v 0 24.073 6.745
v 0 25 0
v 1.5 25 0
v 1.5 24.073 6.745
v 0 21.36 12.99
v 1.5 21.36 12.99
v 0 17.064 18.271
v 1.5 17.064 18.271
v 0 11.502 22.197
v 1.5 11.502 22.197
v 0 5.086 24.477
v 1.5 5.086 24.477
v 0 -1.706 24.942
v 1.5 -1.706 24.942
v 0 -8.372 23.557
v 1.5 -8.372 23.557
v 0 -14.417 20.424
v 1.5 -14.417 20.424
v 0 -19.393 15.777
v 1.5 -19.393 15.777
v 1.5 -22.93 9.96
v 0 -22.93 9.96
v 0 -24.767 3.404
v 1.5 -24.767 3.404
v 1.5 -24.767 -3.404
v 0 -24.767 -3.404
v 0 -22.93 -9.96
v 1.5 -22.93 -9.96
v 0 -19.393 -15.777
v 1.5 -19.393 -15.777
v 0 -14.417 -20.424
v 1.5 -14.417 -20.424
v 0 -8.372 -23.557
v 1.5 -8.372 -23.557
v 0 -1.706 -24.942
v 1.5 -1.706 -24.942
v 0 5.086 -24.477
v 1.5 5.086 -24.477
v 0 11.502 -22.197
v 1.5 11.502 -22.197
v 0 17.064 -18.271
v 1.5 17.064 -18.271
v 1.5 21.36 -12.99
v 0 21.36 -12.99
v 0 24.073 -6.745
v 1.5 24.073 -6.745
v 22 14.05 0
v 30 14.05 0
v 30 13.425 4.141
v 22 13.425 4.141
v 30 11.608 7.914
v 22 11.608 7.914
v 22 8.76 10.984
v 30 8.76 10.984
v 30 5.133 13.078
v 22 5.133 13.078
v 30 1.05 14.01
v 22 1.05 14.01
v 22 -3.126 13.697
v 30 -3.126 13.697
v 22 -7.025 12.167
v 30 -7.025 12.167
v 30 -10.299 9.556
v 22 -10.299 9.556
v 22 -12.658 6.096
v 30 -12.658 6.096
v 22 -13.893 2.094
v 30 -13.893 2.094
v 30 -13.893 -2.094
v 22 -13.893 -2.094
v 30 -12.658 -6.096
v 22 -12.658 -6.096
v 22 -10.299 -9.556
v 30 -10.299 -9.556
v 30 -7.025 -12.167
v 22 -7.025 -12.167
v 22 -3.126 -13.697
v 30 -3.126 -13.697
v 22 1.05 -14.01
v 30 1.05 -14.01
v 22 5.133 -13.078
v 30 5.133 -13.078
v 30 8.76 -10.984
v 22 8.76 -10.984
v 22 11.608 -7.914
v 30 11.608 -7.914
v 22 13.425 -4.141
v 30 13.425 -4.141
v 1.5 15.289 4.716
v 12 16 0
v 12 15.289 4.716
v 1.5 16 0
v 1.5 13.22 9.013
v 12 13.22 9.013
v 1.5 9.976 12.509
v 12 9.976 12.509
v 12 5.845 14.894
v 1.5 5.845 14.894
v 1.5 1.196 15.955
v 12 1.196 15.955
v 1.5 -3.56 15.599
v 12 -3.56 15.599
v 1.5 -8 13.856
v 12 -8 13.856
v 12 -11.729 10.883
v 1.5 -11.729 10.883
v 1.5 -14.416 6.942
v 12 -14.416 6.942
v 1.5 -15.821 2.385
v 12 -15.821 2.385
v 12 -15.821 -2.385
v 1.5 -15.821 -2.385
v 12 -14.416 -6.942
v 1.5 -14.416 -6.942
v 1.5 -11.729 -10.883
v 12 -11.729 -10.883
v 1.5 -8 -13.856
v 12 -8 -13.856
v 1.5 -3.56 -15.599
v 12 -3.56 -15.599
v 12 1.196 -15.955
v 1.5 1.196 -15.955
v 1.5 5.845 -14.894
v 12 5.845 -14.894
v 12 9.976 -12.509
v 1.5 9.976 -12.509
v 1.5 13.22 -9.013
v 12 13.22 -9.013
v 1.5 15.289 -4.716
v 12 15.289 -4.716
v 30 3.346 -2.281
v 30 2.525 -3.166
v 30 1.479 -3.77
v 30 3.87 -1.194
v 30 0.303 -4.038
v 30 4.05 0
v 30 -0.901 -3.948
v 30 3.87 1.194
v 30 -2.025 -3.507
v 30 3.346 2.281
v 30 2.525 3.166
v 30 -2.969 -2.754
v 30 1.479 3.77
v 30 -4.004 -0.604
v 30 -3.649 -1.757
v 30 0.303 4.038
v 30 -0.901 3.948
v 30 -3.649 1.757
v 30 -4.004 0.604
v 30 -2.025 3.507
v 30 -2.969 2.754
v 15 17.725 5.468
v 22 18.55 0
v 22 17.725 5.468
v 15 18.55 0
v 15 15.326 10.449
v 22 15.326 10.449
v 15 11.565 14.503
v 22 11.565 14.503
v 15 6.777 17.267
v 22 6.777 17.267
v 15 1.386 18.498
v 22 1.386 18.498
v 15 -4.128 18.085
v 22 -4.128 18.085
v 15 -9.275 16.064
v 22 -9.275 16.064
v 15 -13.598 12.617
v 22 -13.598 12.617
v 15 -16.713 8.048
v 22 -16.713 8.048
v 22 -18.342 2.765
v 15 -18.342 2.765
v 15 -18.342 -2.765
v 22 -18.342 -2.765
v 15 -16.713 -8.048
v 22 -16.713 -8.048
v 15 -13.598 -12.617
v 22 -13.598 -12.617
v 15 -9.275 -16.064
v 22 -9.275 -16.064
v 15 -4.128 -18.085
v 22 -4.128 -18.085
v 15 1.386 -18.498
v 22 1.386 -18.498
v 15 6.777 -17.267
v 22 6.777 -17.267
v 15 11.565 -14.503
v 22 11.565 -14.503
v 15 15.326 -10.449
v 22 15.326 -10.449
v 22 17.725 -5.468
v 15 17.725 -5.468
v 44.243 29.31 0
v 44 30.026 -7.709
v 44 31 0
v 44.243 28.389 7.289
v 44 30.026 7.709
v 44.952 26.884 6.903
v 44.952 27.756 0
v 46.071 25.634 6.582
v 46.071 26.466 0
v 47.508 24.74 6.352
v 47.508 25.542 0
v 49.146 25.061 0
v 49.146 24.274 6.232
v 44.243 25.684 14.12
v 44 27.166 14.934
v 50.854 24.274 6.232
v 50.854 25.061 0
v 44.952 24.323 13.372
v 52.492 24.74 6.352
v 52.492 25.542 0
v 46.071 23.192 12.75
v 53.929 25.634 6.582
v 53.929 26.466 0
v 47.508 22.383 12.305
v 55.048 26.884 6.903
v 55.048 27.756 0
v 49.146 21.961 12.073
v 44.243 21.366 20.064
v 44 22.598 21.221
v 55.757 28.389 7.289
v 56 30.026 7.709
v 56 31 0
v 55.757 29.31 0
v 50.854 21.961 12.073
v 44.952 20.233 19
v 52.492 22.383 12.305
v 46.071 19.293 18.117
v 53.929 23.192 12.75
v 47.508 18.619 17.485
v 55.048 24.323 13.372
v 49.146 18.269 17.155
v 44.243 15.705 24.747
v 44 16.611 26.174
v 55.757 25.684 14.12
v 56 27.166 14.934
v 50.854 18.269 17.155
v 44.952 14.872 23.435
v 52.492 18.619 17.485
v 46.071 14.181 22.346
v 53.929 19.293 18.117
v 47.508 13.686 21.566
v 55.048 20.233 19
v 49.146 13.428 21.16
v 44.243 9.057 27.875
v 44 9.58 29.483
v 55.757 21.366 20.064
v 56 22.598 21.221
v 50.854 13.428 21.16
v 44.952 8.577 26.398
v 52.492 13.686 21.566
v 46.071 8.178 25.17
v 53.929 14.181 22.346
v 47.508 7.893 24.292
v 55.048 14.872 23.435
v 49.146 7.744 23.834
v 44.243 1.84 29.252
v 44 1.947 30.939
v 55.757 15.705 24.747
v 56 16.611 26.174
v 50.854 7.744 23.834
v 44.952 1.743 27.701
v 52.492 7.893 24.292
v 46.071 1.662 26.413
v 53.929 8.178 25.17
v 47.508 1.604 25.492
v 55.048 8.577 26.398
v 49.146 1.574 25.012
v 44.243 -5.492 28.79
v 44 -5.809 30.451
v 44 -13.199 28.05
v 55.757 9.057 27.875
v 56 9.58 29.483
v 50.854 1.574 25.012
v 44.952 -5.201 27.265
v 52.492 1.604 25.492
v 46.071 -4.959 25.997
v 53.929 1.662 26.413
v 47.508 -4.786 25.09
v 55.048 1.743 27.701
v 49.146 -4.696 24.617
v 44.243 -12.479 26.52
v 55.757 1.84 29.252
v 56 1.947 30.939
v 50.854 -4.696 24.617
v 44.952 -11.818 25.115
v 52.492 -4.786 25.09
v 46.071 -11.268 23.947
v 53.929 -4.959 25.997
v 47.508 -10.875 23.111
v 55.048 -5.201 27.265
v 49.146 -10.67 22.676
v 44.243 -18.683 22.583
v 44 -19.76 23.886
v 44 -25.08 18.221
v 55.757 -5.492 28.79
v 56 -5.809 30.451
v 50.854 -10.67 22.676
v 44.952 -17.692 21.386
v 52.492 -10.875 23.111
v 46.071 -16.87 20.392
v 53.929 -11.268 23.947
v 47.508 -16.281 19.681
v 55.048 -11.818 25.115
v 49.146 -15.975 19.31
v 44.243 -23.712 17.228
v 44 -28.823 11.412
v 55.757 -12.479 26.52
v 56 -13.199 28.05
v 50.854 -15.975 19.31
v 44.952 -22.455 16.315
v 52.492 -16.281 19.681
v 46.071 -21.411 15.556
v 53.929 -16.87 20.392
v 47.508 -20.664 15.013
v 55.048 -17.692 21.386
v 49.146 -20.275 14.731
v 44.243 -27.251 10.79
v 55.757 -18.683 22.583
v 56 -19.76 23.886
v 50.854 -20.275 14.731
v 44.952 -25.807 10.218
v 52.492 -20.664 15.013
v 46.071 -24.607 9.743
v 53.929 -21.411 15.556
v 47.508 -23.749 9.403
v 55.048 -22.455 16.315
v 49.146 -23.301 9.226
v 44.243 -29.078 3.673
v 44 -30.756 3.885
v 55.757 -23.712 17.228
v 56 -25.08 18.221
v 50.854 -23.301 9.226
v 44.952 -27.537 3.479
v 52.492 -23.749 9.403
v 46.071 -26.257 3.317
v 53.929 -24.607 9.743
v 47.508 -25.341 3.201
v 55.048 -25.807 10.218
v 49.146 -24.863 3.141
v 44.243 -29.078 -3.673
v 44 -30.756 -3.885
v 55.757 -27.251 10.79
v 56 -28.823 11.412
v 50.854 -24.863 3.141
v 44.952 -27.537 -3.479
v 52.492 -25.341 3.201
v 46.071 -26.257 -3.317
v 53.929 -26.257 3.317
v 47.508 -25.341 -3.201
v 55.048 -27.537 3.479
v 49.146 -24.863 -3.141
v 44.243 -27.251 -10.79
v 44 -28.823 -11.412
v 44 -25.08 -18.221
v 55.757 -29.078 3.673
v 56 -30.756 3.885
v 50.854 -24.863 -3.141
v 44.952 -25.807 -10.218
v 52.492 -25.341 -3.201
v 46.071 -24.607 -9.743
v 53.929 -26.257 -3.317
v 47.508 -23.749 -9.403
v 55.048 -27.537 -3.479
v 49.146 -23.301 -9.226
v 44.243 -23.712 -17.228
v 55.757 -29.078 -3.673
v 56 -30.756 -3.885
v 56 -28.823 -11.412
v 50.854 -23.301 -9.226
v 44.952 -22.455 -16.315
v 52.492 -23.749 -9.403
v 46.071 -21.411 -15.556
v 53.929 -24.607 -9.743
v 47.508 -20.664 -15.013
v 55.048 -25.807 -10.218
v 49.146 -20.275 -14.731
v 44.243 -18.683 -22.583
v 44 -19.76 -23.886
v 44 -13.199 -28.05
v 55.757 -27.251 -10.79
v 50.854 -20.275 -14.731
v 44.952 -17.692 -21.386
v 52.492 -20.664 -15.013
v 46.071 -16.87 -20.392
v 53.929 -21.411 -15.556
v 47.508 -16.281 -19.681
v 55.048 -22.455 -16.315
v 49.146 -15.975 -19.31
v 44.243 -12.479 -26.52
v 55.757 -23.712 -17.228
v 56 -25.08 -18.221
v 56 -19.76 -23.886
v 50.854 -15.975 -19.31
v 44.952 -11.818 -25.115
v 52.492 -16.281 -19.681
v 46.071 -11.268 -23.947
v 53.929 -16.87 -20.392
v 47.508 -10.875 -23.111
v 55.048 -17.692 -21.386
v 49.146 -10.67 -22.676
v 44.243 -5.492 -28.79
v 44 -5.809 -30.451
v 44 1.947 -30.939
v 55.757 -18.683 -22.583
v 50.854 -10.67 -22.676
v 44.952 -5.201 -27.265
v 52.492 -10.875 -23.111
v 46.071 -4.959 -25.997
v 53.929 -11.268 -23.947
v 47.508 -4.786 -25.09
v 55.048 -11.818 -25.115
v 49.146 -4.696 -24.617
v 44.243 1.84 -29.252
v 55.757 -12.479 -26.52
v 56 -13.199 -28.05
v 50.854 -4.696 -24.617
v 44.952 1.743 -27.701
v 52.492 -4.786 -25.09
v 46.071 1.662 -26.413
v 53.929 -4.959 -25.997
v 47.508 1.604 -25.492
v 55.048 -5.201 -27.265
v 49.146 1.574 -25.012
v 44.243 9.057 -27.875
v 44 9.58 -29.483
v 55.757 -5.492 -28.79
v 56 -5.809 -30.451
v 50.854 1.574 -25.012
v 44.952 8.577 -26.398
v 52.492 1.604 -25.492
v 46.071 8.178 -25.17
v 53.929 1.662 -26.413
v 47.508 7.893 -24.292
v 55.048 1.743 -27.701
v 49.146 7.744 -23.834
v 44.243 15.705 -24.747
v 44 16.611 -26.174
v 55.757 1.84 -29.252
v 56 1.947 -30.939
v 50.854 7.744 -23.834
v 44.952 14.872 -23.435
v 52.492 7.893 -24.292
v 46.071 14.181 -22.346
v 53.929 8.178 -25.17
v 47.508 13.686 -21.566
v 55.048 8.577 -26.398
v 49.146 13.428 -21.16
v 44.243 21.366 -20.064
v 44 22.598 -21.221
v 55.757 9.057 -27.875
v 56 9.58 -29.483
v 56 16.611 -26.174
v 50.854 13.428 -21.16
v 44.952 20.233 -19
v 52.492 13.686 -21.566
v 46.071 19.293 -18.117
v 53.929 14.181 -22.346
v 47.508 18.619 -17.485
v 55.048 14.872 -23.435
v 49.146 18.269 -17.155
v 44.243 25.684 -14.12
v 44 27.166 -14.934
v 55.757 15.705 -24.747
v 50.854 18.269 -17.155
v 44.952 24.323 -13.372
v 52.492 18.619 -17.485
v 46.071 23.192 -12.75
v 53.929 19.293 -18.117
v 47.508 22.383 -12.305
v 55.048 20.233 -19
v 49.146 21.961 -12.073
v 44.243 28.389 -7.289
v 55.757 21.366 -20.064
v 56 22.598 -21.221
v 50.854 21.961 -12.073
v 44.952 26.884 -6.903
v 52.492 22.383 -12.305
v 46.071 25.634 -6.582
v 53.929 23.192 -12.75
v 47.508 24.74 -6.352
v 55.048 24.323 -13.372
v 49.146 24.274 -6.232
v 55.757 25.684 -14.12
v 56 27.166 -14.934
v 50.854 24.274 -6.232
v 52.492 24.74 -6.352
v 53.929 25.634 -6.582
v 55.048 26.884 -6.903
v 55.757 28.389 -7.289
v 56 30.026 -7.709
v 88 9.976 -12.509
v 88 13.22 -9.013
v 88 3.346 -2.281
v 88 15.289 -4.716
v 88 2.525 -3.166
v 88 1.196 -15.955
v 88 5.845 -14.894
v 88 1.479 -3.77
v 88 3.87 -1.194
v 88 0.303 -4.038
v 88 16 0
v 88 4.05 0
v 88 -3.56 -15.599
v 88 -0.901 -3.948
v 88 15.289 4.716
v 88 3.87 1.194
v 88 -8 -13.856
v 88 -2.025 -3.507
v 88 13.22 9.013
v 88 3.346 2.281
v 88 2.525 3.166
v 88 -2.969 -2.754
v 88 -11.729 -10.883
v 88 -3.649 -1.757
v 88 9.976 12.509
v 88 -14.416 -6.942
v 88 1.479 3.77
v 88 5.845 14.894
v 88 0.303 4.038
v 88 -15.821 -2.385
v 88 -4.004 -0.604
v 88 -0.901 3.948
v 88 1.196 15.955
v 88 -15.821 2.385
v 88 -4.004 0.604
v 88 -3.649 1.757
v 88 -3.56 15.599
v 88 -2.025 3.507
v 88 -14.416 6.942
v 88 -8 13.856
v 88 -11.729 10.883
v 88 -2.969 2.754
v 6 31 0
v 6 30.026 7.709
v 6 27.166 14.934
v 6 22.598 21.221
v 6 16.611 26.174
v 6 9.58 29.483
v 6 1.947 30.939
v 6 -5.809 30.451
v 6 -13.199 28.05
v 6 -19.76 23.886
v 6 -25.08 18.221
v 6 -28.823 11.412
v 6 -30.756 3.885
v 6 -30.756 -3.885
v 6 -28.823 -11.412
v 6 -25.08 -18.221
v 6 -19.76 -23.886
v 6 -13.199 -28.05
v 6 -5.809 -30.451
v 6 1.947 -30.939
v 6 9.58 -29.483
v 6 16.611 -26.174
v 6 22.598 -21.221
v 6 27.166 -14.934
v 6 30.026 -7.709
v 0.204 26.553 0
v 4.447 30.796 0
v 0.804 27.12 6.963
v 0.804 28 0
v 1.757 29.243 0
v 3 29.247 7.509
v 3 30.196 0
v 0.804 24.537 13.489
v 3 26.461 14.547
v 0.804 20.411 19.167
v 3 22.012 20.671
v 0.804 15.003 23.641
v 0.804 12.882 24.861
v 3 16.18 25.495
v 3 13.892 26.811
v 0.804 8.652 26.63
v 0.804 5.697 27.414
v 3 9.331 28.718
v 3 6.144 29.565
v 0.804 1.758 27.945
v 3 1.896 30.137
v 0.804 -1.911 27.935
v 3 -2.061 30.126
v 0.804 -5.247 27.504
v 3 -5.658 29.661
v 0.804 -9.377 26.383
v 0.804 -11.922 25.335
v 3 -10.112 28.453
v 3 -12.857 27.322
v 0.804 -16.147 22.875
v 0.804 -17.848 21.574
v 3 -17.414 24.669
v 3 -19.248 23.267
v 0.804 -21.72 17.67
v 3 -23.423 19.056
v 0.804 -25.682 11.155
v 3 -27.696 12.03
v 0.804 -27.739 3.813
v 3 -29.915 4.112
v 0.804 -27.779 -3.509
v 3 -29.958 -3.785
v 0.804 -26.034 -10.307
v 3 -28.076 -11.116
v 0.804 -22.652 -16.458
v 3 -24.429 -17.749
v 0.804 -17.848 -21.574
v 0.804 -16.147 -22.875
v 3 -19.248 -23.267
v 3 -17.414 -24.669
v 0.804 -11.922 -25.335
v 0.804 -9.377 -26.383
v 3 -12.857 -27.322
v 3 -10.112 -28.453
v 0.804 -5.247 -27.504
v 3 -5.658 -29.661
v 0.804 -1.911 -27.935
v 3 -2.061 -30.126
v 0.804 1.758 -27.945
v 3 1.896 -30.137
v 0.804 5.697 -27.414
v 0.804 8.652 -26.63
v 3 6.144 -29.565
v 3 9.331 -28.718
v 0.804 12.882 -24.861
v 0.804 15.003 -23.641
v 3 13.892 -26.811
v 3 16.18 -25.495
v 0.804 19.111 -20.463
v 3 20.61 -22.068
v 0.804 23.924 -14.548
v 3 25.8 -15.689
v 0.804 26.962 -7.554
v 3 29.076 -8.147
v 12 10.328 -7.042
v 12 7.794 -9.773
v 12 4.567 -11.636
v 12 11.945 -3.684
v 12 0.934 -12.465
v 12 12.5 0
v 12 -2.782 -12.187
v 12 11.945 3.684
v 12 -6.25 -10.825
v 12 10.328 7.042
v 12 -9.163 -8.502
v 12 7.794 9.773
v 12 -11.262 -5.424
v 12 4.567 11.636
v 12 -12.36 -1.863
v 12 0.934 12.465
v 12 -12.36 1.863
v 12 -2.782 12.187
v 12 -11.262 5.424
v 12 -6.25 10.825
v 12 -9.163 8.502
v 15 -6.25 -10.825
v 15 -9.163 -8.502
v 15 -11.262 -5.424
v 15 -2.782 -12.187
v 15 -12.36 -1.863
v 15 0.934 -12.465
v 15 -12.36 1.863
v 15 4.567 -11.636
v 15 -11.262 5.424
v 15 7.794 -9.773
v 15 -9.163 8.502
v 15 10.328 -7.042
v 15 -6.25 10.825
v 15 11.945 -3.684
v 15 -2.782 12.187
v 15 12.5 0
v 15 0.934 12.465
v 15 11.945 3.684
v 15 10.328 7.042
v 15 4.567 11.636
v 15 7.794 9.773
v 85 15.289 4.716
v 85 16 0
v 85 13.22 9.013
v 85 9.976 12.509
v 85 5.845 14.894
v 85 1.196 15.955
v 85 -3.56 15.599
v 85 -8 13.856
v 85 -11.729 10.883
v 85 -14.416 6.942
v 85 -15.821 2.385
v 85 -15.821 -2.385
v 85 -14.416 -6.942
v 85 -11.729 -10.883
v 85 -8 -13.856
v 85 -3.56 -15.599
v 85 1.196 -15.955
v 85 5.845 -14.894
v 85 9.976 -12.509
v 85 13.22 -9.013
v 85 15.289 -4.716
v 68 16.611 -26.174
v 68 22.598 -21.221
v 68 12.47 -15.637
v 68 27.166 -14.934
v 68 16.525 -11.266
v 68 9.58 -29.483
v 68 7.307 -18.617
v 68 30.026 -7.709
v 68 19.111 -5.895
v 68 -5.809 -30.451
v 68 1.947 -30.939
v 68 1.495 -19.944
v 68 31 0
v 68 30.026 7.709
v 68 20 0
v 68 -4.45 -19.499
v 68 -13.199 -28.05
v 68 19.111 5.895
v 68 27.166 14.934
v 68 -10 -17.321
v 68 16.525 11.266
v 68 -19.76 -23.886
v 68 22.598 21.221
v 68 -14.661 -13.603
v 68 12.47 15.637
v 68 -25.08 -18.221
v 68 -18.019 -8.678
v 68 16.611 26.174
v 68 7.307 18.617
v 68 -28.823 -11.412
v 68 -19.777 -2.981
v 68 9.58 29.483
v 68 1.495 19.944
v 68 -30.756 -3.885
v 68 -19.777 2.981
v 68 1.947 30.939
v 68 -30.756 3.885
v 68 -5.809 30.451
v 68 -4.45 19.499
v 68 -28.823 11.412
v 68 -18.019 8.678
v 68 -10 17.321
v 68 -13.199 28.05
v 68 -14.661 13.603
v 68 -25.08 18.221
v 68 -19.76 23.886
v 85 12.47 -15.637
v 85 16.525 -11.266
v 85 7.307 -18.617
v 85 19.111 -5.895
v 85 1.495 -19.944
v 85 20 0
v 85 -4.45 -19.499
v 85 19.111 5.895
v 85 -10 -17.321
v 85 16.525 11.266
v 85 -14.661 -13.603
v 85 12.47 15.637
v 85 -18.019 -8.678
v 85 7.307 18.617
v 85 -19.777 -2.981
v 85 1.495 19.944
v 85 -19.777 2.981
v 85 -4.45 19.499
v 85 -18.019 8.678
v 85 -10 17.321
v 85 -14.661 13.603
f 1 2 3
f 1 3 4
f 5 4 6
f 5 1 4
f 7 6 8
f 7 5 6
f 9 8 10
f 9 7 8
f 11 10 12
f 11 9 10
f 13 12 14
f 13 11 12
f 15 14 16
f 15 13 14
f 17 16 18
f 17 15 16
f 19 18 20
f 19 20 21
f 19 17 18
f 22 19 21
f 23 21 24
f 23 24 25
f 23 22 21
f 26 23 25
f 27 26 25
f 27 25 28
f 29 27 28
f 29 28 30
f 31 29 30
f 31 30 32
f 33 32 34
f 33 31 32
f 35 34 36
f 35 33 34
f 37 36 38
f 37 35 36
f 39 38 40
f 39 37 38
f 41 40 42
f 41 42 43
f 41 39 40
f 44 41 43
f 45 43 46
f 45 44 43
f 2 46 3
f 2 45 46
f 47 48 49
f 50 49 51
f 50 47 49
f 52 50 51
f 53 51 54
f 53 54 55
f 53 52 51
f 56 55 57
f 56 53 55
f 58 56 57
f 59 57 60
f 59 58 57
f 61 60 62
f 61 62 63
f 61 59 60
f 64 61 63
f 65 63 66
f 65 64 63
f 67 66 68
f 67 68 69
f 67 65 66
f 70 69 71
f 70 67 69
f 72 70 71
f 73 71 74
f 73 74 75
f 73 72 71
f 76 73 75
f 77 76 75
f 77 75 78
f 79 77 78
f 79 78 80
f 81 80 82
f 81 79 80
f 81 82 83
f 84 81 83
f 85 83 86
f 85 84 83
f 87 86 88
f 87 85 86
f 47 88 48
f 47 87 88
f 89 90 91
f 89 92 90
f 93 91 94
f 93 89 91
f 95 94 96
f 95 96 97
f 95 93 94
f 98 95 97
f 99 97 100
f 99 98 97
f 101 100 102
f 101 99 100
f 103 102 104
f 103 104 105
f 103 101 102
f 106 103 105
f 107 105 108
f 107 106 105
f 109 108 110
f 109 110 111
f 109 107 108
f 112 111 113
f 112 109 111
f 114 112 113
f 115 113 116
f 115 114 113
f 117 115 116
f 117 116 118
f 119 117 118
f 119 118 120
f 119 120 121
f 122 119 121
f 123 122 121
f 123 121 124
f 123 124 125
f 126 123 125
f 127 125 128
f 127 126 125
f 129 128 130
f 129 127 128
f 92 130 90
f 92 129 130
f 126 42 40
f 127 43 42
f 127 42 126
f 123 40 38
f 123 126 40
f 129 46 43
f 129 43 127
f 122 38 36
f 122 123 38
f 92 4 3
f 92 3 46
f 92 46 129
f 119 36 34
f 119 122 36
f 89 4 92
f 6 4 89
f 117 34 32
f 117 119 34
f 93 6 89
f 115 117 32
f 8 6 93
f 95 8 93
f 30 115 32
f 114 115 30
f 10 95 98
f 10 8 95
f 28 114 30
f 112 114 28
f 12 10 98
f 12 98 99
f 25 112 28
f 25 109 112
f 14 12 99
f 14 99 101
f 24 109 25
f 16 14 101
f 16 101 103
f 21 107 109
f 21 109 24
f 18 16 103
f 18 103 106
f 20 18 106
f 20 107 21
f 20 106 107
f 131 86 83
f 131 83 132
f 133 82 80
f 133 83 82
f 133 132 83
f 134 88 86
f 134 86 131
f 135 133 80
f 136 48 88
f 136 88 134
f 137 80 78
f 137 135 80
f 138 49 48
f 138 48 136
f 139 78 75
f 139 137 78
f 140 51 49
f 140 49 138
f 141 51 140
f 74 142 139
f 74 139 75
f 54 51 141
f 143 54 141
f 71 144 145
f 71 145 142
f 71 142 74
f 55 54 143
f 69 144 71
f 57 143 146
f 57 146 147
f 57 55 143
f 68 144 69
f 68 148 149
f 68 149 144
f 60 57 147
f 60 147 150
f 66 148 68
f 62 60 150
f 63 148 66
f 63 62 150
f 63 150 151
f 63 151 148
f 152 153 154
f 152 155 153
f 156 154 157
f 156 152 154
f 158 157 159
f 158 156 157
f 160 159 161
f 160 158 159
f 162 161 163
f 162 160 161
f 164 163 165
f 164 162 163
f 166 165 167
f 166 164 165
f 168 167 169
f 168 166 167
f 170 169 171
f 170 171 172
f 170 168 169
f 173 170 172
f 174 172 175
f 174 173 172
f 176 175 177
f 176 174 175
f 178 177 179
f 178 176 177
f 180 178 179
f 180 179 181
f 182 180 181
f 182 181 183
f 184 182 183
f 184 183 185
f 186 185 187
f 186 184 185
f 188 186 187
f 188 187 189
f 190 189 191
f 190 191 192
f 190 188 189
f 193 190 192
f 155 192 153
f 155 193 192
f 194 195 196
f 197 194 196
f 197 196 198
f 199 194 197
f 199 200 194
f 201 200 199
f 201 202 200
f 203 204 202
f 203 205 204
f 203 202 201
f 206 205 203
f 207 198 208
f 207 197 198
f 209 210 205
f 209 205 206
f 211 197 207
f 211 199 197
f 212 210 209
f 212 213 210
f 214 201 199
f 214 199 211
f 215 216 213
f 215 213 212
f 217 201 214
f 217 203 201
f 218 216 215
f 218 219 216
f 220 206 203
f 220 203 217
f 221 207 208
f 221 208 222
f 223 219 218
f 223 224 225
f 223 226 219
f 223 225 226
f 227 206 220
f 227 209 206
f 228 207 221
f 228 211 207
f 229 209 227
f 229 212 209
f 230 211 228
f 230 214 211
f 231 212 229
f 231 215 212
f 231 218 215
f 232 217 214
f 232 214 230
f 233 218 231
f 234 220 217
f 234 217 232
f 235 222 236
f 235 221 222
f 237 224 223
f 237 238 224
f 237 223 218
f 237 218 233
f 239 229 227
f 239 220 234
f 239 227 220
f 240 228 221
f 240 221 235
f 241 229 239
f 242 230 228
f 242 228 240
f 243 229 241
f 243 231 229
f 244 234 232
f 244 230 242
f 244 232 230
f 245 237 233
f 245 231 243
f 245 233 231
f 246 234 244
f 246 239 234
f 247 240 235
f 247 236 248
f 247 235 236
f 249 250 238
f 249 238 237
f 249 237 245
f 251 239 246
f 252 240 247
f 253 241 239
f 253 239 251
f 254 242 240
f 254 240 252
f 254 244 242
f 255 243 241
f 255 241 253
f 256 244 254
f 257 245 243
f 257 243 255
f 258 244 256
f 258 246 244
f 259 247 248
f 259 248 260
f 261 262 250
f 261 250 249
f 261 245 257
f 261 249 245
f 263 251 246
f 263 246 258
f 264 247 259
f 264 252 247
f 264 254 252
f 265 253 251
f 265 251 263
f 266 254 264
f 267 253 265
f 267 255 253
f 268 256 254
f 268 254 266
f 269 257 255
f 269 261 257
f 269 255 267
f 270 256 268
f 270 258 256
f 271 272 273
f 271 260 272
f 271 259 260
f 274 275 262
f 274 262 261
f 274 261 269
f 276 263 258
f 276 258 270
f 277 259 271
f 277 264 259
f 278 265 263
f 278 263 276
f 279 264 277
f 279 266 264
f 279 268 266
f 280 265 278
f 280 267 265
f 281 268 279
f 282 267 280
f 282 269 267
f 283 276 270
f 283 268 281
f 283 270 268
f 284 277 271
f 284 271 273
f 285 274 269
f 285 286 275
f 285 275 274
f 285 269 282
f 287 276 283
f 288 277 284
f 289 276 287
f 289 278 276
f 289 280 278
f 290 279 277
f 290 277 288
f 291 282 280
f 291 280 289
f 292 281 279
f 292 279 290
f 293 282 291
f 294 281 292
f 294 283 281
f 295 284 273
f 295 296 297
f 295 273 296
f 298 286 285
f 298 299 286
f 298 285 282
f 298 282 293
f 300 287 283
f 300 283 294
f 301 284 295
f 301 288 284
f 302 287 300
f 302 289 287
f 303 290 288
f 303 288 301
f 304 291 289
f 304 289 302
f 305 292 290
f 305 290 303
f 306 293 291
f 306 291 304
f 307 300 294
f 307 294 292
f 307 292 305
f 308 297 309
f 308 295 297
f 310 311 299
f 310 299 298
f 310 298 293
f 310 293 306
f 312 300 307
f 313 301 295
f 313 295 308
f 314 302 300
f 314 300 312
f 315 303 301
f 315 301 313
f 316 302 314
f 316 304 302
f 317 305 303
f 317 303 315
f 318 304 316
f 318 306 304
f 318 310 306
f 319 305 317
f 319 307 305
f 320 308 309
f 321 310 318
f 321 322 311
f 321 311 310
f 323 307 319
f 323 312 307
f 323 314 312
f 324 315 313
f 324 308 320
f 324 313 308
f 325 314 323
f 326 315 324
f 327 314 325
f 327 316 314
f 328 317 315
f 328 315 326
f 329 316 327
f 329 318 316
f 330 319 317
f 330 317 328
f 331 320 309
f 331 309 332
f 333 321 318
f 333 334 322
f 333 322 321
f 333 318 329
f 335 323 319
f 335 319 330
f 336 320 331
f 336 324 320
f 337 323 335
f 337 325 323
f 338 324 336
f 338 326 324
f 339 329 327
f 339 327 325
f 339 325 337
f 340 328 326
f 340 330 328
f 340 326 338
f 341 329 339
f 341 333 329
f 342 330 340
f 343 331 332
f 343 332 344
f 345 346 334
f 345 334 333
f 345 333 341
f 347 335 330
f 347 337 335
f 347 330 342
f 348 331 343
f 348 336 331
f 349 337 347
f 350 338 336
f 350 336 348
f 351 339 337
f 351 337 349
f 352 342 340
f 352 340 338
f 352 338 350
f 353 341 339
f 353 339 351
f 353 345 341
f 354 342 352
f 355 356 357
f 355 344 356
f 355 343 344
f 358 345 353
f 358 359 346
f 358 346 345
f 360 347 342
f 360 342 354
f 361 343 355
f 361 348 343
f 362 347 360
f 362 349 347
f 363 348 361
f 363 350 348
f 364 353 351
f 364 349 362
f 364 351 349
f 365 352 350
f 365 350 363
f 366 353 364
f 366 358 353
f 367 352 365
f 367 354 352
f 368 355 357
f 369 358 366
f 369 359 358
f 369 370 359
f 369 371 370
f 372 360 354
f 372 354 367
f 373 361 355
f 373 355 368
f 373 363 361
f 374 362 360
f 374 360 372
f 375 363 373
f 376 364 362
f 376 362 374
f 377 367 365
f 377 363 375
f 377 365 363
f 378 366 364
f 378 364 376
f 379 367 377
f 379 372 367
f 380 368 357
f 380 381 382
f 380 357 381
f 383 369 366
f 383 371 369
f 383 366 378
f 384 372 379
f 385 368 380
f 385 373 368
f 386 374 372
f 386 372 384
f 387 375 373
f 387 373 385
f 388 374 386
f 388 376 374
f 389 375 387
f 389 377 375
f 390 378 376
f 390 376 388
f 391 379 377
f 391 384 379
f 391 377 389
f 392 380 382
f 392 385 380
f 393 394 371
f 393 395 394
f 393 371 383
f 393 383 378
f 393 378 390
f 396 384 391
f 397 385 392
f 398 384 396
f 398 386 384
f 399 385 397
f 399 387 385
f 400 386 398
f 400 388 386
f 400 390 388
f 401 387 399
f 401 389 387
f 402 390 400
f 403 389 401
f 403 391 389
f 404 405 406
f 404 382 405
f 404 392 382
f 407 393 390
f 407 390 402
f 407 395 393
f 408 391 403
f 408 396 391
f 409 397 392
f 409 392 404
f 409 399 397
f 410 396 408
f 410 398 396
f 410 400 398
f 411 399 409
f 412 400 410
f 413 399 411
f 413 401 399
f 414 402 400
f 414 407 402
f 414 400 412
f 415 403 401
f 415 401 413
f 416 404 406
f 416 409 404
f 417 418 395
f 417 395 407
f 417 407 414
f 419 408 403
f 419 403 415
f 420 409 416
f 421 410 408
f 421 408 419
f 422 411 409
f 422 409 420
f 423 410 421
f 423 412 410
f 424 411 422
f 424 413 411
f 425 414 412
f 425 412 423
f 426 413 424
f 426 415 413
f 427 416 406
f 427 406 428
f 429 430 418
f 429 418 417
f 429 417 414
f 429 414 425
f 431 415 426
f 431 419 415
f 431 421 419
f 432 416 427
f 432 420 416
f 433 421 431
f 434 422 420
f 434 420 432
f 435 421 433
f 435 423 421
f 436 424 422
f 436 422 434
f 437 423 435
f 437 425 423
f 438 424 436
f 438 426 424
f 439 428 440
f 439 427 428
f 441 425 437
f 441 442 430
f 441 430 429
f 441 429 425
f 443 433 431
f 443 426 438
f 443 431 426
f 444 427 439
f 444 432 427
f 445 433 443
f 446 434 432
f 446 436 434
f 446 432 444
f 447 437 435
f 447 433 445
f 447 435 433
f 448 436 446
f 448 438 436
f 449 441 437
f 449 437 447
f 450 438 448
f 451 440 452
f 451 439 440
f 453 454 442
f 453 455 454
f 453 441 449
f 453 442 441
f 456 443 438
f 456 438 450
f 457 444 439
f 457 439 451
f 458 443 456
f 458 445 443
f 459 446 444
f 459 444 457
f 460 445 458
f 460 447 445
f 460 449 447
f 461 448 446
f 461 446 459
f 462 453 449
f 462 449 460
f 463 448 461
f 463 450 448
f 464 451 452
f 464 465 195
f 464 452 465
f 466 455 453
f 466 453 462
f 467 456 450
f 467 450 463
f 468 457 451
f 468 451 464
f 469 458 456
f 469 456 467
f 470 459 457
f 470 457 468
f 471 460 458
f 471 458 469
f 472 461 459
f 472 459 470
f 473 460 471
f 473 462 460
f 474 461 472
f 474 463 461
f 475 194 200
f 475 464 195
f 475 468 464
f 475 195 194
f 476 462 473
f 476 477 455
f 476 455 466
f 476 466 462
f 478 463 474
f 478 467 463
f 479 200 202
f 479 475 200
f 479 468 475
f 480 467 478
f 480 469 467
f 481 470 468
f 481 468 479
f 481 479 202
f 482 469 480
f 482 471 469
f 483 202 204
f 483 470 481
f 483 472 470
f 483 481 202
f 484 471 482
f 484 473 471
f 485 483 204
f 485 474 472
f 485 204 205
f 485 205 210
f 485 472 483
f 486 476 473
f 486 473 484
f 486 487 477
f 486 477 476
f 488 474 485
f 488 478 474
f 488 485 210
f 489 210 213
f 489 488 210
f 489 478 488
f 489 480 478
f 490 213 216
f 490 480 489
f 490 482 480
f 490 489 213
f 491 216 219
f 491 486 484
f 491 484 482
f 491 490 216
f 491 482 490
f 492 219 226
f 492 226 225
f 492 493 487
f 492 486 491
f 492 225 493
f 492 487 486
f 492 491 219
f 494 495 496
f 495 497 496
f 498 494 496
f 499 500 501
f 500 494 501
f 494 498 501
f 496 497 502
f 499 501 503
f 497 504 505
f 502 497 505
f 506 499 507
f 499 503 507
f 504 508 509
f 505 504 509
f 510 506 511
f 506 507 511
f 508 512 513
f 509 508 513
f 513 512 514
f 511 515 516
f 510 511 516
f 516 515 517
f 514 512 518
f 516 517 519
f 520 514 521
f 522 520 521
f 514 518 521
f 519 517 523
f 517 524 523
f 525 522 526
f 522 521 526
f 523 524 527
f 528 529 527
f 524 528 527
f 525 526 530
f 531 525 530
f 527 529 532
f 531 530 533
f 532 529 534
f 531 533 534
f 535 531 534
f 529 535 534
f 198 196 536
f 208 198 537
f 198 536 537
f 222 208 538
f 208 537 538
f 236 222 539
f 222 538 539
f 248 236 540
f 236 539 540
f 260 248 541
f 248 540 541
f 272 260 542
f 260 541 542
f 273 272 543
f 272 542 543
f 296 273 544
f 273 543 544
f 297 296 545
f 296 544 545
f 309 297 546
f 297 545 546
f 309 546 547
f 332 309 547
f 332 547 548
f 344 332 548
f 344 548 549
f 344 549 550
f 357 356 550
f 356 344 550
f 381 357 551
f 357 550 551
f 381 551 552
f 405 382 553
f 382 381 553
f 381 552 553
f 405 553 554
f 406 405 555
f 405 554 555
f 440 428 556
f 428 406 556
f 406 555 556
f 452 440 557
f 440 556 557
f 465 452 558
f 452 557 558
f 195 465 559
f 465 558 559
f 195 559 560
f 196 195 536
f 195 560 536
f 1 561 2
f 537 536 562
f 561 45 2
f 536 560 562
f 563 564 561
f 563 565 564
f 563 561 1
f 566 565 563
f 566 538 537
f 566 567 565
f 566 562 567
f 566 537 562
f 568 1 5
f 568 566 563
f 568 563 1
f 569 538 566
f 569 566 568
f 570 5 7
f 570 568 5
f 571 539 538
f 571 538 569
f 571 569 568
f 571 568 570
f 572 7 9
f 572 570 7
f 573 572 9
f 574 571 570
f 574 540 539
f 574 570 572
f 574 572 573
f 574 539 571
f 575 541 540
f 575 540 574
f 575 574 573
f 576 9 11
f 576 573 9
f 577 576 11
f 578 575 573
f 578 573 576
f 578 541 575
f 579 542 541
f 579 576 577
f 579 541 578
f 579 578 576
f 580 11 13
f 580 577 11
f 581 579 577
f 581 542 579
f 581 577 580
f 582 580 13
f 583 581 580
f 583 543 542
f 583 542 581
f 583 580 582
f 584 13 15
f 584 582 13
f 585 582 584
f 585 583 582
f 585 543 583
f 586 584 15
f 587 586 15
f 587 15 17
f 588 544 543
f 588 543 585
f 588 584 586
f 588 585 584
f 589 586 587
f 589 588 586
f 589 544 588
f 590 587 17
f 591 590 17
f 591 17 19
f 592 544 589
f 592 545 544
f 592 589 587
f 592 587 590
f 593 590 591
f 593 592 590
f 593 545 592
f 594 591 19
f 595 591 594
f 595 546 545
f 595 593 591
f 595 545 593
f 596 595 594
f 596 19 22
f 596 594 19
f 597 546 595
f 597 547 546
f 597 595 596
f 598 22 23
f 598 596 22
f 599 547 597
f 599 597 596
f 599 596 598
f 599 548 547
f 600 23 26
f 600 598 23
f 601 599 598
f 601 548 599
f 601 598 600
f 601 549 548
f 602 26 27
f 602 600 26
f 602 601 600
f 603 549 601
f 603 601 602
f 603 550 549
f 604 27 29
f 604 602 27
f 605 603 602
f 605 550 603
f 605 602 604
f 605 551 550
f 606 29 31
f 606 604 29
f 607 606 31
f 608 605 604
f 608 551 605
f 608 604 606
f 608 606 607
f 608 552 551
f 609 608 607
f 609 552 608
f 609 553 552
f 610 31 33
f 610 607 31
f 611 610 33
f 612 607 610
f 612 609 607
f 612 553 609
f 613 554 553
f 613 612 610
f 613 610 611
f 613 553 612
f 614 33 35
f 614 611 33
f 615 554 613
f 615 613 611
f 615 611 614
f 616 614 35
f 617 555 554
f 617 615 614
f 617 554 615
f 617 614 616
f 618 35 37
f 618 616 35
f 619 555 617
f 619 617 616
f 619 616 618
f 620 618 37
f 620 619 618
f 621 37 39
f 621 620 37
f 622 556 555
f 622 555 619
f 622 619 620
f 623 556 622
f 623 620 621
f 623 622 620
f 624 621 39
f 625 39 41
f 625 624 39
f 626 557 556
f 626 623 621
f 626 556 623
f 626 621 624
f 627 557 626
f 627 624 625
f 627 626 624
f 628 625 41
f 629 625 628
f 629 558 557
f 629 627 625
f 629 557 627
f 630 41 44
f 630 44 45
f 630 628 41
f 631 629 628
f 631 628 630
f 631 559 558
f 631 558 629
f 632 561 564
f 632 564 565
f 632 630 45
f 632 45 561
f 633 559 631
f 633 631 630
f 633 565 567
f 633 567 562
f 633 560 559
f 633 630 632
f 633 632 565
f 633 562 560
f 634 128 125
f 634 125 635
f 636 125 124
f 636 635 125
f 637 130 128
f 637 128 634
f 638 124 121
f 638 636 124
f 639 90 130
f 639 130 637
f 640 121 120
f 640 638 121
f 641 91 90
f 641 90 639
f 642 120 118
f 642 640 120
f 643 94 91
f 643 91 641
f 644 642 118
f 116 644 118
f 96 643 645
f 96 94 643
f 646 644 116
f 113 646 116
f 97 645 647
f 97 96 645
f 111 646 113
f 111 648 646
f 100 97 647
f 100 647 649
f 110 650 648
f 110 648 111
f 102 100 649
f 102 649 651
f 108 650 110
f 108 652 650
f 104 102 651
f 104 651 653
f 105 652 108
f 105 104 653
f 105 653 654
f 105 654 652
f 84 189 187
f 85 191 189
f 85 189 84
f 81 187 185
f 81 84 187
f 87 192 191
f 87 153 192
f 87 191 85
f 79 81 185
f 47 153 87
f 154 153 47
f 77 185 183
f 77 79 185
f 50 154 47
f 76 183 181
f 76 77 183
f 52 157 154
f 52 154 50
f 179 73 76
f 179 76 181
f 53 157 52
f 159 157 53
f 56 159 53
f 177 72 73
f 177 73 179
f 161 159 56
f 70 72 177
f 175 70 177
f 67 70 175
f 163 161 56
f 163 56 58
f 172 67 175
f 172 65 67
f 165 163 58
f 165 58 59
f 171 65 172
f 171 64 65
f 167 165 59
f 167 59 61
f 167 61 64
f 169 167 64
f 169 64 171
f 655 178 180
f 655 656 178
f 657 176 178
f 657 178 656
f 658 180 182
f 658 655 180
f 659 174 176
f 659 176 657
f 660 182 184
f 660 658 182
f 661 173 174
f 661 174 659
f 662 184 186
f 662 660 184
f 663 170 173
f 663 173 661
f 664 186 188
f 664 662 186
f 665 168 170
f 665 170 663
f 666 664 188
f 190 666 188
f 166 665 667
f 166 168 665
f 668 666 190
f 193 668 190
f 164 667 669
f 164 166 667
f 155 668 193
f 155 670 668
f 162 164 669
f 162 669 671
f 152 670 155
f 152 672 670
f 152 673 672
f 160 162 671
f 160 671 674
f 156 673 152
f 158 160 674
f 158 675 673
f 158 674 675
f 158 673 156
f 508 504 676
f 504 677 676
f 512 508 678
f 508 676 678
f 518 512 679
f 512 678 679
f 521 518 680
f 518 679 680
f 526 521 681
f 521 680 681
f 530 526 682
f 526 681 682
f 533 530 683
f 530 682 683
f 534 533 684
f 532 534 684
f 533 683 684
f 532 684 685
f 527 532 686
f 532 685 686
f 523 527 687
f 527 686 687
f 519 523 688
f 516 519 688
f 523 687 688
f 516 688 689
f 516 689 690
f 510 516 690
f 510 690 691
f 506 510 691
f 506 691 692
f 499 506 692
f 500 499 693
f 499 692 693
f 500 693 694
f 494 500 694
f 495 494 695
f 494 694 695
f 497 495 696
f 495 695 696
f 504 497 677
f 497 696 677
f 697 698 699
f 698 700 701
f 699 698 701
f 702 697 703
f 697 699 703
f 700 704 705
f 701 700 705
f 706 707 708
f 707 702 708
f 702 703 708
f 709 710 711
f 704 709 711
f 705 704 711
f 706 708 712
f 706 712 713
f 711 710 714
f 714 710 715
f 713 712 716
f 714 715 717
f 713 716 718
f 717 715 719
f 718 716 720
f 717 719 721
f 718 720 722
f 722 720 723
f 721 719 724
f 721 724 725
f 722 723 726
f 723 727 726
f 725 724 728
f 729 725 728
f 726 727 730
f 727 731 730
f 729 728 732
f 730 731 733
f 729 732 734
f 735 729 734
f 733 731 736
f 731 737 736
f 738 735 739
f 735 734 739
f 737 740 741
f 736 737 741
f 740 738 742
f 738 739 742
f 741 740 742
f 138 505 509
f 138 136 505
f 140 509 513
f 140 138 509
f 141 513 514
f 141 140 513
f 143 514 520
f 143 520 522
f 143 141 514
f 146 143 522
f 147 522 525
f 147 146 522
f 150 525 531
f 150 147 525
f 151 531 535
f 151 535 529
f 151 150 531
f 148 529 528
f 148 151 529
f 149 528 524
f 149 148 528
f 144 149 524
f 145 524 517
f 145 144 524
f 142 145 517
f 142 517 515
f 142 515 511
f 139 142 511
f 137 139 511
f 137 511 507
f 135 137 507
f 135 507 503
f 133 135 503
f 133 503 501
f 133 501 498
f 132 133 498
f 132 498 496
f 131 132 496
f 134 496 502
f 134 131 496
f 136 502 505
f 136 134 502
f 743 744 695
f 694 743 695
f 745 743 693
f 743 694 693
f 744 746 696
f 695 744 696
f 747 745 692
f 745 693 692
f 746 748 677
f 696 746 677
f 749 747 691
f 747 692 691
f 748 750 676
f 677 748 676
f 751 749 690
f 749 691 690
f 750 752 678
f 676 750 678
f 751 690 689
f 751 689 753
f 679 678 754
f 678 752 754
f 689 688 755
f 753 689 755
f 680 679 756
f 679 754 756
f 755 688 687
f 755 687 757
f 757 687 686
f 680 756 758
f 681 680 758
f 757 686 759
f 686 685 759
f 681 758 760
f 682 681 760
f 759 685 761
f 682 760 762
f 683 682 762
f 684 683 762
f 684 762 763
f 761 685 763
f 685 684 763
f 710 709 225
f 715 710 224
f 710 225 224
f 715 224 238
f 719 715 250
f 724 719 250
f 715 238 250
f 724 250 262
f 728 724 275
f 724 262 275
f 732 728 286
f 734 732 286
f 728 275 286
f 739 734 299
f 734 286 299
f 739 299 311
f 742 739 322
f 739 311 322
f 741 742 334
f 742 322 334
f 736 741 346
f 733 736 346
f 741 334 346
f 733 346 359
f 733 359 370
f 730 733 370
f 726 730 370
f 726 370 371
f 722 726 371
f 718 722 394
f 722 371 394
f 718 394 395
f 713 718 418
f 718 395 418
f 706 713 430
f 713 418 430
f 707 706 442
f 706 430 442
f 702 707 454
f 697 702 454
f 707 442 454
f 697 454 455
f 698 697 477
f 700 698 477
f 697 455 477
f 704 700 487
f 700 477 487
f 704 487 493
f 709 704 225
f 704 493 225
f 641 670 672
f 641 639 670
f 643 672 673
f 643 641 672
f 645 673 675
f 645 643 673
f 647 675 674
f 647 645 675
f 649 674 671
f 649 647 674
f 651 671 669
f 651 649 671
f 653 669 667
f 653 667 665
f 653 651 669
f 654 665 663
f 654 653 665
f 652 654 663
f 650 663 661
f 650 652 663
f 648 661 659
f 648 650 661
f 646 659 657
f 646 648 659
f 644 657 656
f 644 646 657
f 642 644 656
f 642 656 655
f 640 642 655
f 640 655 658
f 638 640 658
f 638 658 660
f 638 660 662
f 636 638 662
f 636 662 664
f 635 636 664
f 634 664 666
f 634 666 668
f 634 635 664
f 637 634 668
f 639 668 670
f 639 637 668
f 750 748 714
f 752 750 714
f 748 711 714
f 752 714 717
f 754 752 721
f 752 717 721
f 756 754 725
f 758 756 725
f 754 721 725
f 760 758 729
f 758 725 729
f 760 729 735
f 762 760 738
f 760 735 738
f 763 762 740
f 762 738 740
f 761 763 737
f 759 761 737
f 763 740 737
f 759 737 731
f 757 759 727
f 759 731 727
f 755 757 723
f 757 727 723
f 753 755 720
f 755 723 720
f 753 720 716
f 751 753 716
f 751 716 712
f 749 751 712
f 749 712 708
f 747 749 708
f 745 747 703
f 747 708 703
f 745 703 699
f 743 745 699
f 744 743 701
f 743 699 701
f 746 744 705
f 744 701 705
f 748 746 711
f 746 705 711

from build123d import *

# Parameters (mm, degrees)
F2_R = 6
F3_R = 6


with BuildPart() as f1:
    # F0 (on Top) → F1 (revolve)
    with BuildSketch(Plane.XY):
        Polygon((0, 31), (0, 0), (88, 0), (88, 16), (85, 16), (85, 20), (68, 20), (68, 31), align=None)
    revolve(axis=Axis((49.862798, 0, 0), (1, 0, 0)))

    # F2
    f2_edges = [f1.edges().sort_by_distance(p)[0] for p in [
        (0, -31, 0),
    ]]
    fillet(f2_edges, radius=F2_R)

    # F3 (on Top) → F4 (revolve, cut)
    with BuildSketch(Plane.XY):
        with Locations((50, 31)):
            Circle(F3_R)
    revolve(axis=Axis((49.862798, 0, 0), (1, 0, 0)), mode=Mode.SUBTRACT)

    # F5 (on Top) → F6 (revolve, cut)
    with BuildSketch(Plane.XY):
        Polygon((0, 25), (0, 0), (88, 0), (88, 4.04958), (30, 4.04958), (30, 14.04958), (22, 14.04958), (22, 18.54958), (15, 18.54958), (15, 12.5), (12, 12.5), (12, 16), (1.5, 16), (1.5, 25), align=None)
    revolve(axis=Axis((49.862798, 0, 0), (1, 0, 0)), mode=Mode.SUBTRACT)


solid = f1.part
